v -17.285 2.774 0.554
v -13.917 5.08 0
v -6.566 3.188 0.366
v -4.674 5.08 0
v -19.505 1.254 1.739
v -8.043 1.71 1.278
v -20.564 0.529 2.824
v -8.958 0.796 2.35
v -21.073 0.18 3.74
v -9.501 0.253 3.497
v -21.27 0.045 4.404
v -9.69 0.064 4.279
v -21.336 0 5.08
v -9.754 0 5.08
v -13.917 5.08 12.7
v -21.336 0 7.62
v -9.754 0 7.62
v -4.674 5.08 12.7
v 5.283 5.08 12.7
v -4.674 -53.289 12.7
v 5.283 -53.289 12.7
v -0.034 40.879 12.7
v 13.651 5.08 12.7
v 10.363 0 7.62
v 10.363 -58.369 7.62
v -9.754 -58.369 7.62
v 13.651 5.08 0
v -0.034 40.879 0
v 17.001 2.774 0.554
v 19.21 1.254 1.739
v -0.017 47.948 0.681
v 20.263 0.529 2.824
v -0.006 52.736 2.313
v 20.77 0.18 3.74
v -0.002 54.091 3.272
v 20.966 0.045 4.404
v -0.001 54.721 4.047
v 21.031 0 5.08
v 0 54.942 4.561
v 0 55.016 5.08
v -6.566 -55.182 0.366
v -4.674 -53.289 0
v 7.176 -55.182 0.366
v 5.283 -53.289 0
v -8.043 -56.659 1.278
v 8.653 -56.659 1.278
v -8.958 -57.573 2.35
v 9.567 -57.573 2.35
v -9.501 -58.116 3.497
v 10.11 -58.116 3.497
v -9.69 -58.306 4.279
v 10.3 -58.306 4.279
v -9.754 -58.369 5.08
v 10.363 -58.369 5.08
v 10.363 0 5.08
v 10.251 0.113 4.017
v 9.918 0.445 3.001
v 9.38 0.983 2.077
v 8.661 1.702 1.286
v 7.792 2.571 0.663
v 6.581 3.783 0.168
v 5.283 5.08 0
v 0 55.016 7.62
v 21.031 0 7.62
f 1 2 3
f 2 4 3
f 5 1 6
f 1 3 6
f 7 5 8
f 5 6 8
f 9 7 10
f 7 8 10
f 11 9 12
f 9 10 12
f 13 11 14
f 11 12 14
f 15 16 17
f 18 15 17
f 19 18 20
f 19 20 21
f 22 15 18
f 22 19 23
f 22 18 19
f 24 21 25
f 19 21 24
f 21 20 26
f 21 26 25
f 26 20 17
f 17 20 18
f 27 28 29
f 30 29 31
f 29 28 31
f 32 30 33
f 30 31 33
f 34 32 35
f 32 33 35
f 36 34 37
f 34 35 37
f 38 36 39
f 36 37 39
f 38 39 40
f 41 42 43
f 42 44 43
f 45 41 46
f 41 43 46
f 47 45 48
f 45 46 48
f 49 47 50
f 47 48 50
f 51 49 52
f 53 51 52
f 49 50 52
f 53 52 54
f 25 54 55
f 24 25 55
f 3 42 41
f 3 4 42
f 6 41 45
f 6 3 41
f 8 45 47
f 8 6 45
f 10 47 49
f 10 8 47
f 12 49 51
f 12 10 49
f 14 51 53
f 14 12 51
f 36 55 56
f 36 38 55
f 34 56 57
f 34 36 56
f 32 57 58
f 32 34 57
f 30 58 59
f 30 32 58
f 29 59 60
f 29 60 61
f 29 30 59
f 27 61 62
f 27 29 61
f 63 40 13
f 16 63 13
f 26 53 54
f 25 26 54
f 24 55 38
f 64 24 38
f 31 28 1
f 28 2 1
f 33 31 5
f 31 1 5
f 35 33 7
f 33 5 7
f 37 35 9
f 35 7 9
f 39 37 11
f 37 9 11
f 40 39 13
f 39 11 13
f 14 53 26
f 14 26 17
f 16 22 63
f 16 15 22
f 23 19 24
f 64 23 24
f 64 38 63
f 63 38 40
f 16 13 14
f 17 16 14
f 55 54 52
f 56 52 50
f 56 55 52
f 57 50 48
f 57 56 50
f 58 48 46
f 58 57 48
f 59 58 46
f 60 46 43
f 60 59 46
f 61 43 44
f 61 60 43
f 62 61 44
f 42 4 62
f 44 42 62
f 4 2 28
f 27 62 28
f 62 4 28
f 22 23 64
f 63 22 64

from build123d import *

# Parameters (mm, degrees)
F0_W     = 20.116801
F0_H     = 58.369201
F1_DEPTH = 12.7
F2_SIZE  = 5.08
F3_R     = 5.08


with BuildPart() as f1:
    # F0 (on Top) → F1 (new body)
    with BuildSketch(Plane.XY):
        Polygon((21.031201, 0), (0, 55.016398), (-21.336, 0), (-9.753601, 0), (10.3632, 0), align=None)
        with Locations((0.304799, -29.1846)):
            Rectangle(F0_W, F0_H)
    extrude(amount=F1_DEPTH)

    # F2
    f2_edges = [f1.edges().sort_by_distance(p)[0] for p in [
        (10.5156, 27.508199, 12.7),
        (-10.668, 27.508199, 12.7),
        (-15.544801, 0, 12.7),
        (-9.753601, -29.1846, 12.7),
        (0.3048, -58.369201, 12.7),
        (10.3632, -29.1846, 12.7),
        (15.6972, 0, 12.7),
    ]]
    chamfer(f2_edges, length=F2_SIZE)

    # F3
    f3_edges = [f1.edges().sort_by_distance(p)[0] for p in [
        (10.5156, 27.508199, 0),
        (-10.668, 27.508199, 0),
        (-15.544801, 0, 0),
        (-9.753601, -29.1846, 0),
        (0.3048, -58.369201, 0),
        (10.3632, -29.1846, 0),
        (15.6972, 0, 0),
    ]]
    fillet(f3_edges, radius=F3_R)


solid = f1.part
